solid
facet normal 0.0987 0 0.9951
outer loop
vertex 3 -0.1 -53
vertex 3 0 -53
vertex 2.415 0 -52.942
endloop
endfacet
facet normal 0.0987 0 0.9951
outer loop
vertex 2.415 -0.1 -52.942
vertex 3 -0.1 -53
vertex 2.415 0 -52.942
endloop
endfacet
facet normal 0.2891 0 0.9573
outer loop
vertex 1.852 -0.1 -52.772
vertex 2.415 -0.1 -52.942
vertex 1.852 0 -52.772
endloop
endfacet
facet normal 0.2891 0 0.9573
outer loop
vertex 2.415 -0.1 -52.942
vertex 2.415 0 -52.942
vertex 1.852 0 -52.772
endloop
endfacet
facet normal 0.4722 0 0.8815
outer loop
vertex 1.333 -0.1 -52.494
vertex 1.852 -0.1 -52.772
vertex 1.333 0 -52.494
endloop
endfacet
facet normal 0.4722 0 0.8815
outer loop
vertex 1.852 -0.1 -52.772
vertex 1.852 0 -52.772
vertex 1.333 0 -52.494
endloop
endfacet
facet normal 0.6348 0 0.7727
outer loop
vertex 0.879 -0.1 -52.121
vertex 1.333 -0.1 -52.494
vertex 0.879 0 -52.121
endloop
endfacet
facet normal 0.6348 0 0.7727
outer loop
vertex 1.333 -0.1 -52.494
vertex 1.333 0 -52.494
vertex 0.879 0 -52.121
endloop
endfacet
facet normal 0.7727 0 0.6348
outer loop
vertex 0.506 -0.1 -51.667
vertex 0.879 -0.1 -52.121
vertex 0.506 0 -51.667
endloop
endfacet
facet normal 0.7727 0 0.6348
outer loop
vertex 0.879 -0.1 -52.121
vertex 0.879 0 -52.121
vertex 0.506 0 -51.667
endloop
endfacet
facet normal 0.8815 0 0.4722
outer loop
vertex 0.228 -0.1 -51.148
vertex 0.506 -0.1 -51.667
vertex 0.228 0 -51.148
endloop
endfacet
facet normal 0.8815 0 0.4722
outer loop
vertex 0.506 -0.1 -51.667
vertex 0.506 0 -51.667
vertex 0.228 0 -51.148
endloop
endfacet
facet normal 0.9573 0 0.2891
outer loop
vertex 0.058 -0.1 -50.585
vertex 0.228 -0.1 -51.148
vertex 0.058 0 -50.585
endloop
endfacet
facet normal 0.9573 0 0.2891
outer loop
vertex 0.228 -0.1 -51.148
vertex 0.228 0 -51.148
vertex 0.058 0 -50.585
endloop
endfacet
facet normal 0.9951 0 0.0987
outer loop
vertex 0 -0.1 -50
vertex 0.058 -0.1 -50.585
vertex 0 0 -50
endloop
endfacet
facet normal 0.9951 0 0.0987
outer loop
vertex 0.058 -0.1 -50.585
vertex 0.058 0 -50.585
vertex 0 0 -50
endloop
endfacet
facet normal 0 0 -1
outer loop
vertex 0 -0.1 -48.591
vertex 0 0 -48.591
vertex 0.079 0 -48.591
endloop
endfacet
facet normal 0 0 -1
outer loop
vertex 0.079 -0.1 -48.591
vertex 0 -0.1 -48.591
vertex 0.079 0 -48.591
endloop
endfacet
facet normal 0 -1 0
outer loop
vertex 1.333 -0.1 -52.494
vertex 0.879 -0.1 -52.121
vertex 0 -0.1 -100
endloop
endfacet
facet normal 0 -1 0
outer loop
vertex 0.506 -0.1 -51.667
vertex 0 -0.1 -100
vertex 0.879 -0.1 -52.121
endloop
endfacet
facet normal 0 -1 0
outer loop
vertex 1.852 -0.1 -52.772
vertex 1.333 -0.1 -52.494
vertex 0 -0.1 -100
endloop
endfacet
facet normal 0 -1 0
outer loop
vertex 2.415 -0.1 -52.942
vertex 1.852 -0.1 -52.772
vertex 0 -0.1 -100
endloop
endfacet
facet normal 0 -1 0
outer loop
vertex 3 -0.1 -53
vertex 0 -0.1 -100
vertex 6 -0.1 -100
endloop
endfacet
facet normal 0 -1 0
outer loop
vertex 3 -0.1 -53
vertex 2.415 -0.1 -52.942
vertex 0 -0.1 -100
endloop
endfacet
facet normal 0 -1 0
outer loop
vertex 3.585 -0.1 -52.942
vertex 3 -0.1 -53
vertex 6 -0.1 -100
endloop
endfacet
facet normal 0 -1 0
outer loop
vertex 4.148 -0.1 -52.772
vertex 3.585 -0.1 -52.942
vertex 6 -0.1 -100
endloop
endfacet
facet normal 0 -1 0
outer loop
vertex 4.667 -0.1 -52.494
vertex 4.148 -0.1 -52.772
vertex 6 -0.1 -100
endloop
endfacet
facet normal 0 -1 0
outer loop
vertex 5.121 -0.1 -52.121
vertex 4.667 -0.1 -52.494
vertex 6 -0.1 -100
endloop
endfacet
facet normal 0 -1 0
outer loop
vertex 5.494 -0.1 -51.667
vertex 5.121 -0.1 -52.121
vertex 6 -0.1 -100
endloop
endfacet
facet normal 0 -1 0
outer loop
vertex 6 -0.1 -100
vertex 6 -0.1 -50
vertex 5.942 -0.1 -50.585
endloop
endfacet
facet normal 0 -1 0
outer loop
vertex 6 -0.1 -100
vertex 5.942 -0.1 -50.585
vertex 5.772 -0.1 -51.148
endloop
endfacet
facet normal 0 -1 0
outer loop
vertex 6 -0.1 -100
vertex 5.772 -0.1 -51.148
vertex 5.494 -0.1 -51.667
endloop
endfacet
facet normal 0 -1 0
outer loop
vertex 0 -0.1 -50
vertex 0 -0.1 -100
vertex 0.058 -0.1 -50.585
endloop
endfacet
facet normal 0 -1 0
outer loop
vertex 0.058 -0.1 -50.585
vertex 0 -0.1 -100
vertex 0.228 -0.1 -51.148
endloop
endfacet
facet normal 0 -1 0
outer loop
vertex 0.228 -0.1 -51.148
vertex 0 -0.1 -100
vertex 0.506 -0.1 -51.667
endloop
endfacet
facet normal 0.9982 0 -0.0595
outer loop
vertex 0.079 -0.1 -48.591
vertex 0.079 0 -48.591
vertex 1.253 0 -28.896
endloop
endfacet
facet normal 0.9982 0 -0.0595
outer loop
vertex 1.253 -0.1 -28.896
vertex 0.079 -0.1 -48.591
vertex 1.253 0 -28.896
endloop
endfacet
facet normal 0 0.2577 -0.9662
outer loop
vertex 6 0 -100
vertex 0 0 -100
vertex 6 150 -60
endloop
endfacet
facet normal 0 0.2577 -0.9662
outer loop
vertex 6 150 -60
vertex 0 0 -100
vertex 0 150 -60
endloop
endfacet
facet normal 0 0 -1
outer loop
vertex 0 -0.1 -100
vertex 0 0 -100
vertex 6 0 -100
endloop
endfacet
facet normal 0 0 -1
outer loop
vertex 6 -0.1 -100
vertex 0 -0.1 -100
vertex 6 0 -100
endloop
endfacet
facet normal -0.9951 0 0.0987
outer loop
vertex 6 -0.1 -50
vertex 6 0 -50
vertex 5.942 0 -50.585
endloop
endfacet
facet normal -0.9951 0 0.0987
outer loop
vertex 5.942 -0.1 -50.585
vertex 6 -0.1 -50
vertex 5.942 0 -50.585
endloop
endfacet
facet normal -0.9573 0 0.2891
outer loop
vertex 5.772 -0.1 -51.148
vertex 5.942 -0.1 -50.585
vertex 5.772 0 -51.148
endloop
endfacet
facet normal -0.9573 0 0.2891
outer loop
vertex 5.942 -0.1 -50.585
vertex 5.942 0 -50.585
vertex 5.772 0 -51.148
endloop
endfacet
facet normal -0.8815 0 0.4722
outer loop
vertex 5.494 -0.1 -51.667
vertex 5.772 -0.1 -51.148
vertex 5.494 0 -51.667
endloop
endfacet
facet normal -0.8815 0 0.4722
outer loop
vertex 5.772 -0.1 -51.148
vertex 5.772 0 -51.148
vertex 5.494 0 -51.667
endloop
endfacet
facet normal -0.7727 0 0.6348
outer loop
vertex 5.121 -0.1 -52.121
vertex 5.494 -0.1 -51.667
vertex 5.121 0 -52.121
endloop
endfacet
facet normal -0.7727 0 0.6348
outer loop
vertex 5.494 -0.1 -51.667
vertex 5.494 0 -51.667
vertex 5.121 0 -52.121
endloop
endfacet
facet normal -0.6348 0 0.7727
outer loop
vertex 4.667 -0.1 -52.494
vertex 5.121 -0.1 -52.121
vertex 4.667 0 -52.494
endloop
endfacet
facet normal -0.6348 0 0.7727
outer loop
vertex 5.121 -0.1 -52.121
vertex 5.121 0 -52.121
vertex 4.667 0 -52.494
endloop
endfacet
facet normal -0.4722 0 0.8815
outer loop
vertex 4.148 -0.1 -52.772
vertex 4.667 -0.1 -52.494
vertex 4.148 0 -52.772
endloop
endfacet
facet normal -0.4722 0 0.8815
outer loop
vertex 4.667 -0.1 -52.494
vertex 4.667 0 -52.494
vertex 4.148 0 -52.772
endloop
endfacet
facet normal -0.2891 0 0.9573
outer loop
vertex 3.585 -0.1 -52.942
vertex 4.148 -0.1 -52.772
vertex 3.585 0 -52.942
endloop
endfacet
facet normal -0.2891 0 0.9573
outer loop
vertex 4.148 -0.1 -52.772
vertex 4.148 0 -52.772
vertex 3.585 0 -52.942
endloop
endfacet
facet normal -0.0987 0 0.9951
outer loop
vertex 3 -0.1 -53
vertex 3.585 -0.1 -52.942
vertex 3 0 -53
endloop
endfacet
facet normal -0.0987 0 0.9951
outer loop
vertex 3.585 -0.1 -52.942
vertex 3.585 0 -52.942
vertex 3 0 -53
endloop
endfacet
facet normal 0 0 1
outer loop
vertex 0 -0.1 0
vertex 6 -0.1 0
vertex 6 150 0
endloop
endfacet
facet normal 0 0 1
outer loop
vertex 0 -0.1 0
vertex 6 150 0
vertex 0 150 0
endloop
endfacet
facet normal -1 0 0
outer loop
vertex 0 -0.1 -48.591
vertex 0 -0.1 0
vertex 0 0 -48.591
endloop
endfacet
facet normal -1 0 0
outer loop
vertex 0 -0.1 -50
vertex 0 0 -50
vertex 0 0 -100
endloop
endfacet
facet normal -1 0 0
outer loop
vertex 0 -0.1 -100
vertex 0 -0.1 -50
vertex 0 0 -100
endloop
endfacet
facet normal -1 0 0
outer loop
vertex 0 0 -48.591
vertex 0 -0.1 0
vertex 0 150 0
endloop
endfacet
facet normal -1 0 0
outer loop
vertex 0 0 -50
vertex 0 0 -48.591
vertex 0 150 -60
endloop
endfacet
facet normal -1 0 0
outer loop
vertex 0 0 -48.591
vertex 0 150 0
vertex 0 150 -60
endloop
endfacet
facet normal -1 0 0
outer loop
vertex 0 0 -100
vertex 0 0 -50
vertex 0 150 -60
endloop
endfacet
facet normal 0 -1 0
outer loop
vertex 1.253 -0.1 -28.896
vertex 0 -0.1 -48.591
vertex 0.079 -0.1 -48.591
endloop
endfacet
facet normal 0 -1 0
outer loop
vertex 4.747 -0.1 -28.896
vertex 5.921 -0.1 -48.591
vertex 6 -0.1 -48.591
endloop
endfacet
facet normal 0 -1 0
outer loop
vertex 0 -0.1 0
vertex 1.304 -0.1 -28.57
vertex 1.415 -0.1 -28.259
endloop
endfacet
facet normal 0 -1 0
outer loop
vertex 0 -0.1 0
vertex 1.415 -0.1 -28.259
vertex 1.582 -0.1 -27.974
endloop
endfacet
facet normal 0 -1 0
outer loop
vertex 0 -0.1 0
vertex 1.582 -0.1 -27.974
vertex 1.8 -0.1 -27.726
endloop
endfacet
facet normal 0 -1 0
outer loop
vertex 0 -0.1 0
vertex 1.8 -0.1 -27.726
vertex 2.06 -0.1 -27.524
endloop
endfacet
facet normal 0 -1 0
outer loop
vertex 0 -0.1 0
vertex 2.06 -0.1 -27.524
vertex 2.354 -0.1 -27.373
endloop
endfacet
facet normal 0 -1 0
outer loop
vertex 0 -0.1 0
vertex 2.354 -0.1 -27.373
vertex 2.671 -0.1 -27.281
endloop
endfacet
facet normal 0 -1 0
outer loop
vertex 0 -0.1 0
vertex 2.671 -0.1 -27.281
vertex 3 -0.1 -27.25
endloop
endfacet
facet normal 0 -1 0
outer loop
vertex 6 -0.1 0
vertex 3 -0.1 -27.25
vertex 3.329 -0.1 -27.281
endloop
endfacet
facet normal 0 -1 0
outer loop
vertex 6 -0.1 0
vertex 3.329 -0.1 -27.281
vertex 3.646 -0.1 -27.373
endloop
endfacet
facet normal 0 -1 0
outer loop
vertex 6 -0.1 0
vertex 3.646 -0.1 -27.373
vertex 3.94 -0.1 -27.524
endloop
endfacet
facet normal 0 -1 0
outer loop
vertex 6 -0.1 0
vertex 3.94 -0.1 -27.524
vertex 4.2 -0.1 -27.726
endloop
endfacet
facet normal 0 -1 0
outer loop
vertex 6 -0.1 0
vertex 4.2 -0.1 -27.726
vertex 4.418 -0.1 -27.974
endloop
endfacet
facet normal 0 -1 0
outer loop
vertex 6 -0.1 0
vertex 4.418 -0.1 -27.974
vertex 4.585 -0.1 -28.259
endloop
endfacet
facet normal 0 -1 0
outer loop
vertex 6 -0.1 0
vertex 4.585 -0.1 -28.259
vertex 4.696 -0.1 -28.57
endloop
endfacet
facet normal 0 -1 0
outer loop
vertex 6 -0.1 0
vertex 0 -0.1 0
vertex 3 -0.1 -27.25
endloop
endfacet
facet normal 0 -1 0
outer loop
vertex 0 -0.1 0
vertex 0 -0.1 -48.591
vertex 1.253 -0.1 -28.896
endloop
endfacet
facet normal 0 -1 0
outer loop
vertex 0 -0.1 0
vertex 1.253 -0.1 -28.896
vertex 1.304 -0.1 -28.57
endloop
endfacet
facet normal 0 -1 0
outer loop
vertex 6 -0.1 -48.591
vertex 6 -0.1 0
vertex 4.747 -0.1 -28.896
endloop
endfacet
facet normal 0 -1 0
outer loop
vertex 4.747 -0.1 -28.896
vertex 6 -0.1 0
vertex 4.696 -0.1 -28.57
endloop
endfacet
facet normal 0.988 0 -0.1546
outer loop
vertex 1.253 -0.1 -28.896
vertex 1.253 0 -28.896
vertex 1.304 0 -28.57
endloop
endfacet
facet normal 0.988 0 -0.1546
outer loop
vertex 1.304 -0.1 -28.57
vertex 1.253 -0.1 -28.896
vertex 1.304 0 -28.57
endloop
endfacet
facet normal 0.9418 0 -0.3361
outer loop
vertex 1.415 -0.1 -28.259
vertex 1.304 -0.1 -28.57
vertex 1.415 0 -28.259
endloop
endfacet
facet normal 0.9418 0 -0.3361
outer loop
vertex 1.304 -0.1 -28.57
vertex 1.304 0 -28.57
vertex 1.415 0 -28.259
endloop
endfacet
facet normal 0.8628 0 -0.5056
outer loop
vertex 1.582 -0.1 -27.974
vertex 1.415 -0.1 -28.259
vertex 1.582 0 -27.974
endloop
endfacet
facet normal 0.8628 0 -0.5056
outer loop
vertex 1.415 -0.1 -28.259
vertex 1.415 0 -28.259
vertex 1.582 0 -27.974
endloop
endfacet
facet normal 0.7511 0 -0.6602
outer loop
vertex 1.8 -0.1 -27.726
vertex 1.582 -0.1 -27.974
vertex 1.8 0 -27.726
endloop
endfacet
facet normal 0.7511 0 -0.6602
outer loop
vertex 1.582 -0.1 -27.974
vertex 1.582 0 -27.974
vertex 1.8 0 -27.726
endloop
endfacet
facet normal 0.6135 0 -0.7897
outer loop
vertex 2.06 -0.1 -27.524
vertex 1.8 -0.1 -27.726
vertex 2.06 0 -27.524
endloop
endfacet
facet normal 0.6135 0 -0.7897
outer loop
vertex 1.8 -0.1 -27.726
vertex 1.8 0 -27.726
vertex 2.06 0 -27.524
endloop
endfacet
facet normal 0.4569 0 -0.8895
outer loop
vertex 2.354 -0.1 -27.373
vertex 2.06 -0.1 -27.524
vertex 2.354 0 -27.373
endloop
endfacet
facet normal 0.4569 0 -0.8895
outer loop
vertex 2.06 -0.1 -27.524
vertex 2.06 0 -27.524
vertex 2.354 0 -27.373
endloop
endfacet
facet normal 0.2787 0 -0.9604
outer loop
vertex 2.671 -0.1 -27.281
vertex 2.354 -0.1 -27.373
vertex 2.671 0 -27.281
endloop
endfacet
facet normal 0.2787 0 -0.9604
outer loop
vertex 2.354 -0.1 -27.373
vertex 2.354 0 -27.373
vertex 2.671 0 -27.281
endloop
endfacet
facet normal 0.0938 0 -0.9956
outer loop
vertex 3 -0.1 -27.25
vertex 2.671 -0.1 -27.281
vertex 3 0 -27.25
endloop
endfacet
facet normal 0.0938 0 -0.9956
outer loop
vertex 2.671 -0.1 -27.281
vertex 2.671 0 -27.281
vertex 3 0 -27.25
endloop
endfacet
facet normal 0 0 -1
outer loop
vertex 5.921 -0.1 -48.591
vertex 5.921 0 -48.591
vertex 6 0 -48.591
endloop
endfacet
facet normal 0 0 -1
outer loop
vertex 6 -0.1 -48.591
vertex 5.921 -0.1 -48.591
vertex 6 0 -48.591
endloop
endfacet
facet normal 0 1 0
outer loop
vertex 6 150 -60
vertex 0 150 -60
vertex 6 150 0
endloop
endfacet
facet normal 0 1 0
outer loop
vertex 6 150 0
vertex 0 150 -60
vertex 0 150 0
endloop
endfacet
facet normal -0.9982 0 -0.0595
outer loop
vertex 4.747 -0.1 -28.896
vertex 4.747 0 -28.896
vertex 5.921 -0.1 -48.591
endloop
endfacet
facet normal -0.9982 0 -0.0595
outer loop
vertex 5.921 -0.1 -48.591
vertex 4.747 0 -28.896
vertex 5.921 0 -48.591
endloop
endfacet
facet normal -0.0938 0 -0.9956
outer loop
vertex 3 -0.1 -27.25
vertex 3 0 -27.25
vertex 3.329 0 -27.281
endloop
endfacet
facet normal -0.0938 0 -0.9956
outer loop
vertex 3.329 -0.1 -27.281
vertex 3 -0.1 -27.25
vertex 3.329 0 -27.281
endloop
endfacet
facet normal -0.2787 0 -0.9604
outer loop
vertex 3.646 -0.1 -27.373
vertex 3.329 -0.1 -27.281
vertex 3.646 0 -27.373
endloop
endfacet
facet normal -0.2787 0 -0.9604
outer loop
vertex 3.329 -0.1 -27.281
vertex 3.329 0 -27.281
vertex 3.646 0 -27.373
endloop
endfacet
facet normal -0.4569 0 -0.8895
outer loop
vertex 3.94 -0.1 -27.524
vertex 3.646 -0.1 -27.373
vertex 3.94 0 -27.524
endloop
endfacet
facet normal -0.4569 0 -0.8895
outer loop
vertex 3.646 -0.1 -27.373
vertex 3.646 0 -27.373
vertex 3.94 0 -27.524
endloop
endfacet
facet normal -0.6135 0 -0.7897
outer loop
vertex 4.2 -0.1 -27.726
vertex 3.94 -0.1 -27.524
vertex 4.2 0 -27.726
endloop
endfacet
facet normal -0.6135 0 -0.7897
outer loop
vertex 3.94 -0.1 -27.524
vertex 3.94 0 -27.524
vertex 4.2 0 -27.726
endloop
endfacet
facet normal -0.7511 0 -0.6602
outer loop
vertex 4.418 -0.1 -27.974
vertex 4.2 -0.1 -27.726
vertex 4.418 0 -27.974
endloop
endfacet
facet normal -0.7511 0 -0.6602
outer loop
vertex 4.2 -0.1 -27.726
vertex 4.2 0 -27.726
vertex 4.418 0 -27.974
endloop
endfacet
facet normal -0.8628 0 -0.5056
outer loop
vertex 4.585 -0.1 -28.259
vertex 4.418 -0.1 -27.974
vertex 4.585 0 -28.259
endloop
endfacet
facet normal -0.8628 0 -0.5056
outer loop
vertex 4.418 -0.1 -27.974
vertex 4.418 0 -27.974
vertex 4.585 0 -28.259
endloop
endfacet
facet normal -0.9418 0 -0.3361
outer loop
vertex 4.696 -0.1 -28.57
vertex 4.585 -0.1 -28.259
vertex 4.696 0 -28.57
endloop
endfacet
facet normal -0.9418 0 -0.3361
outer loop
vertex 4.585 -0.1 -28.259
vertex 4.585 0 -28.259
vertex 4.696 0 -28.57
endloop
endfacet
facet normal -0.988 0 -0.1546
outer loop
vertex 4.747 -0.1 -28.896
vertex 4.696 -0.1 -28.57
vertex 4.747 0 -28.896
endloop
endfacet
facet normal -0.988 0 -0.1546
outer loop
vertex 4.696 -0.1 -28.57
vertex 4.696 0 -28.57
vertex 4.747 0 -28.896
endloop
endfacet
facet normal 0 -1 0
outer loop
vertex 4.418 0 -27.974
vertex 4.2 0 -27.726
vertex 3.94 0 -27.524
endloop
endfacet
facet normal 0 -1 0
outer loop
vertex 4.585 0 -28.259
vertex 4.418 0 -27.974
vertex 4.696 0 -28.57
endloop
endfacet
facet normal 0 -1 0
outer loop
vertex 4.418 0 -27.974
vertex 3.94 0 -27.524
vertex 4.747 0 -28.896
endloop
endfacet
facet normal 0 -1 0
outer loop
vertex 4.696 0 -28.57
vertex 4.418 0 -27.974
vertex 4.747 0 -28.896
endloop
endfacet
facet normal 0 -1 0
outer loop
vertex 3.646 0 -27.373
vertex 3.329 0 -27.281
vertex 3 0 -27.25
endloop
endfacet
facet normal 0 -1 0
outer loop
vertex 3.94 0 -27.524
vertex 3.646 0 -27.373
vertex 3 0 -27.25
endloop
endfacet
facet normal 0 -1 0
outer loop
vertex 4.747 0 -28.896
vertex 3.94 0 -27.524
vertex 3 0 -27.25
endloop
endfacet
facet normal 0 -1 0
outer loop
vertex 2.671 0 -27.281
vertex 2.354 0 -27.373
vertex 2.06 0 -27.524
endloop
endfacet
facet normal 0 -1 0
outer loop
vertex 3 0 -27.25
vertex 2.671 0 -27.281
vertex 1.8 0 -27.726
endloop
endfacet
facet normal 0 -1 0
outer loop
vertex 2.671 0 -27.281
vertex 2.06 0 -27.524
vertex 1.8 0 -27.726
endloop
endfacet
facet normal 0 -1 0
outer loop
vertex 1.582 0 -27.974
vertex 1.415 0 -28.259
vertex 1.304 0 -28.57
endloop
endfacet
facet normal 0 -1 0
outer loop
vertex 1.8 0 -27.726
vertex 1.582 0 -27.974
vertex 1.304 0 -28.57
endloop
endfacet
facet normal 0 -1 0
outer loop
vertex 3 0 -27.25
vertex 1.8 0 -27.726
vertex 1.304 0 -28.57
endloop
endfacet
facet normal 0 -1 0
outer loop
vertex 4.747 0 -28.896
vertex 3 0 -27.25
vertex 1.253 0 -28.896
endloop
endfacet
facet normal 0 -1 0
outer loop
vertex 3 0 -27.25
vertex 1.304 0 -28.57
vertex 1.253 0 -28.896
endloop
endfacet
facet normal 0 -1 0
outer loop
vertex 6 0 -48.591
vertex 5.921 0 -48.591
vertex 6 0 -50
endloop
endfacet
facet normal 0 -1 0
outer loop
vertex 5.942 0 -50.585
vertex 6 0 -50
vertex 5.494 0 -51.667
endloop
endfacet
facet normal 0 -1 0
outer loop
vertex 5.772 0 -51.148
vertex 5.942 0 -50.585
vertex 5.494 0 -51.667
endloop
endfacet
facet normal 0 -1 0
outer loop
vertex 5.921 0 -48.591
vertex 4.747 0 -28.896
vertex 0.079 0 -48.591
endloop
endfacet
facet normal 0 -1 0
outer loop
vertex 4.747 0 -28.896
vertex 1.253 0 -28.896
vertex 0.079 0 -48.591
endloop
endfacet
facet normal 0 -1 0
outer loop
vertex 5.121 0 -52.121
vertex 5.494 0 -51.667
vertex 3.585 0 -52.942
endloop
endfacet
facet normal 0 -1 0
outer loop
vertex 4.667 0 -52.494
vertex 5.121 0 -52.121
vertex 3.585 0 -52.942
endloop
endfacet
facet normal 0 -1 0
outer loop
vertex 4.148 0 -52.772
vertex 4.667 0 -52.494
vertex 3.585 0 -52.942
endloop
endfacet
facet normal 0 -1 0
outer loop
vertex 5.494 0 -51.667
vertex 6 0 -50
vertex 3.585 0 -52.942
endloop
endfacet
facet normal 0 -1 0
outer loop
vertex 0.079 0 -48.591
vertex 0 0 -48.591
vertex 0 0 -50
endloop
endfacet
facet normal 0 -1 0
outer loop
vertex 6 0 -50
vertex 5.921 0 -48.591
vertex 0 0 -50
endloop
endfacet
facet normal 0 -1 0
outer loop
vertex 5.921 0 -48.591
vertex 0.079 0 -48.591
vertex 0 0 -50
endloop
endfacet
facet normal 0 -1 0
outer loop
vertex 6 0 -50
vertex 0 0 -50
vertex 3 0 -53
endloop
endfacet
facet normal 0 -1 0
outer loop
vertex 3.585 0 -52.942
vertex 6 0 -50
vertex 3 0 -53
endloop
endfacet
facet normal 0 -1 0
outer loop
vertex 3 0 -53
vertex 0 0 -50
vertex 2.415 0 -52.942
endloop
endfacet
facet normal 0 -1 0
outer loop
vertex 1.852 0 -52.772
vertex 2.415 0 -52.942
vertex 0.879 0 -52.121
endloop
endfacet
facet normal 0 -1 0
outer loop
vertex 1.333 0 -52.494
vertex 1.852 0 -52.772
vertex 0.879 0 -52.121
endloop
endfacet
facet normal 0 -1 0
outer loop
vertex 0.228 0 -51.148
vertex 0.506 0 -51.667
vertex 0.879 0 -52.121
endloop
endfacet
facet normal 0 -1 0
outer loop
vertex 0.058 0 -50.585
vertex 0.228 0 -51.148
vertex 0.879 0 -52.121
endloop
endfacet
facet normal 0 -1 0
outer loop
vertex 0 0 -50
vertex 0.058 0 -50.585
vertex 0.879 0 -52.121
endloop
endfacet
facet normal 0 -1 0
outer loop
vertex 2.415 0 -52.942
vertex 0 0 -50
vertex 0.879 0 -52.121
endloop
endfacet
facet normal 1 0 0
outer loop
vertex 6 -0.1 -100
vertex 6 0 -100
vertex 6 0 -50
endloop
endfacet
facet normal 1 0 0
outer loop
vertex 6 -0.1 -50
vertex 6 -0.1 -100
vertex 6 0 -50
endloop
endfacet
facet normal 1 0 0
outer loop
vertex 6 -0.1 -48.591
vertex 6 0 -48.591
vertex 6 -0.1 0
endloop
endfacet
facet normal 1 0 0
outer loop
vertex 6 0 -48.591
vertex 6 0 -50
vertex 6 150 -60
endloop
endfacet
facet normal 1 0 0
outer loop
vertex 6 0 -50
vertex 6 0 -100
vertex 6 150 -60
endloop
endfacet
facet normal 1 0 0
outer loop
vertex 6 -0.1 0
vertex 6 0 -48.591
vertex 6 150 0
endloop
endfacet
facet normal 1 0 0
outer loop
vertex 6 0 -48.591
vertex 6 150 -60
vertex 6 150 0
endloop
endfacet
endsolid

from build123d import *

# Parameters (mm, degrees)
EXTRUDE_1_DEPTH     = 6
BOSS_EXTRUDE4_DEPTH = 0.1


with BuildPart() as part:
    # Эскиз1 → Бобышка-Вытянуть1 (new body)
    with BuildSketch(Plane(origin=(0, 0, 0), x_dir=(0, 0, -1), z_dir=(1, 0, 0))):
        Polygon((0, 0), (100, 0), (60, 150), (0, 150), align=None)
    extrude(amount=EXTRUDE_1_DEPTH)

    # Sketch1 → Boss-Extrude4 (add)
    with BuildSketch(Plane.XZ):
        with BuildLine():
            Line((3, -27.25), (3, 0))
            Line((3, 0), (0, 0))
            Line((0, 0), (0, -48.591302246))
            Line((0, -48.591302246), (0.078671208, -48.591302246))
            Line((0.078671208, -48.591302246), (1.253102949, -28.895833333))
            ThreePointArc((1.253102949, -28.895833333), (1.799956598, -27.726266969), (3, -27.25))
        make_face()
        with BuildLine():
            Line((6, 0), (3, 0))
            Line((3, 0), (3, -27.25))
            ThreePointArc((3, -27.25), (4.200043402, -27.726266969), (4.746897051, -28.895833333))
            Line((4.746897051, -28.895833333), (5.921328792, -48.591302246))
            Line((5.921328792, -48.591302246), (6, -48.591302246))
            Line((6, -48.591302246), (6, 0))
        make_face()
        with BuildLine():
            Line((6, -100), (6, -50))
            ThreePointArc((6, -50), (5.121320344, -52.121320344), (3, -53))
            Line((3, -53), (3, -100))
            Line((3, -100), (6, -100))
        make_face()
        with BuildLine():
            ThreePointArc((3, -53), (0.878679656, -52.121320344), (0, -50))
            Line((0, -50), (0, -100))
            Line((0, -100), (3, -100))
            Line((3, -100), (3, -53))
        make_face()
    extrude(amount=BOSS_EXTRUDE4_DEPTH)


solid = part.part
